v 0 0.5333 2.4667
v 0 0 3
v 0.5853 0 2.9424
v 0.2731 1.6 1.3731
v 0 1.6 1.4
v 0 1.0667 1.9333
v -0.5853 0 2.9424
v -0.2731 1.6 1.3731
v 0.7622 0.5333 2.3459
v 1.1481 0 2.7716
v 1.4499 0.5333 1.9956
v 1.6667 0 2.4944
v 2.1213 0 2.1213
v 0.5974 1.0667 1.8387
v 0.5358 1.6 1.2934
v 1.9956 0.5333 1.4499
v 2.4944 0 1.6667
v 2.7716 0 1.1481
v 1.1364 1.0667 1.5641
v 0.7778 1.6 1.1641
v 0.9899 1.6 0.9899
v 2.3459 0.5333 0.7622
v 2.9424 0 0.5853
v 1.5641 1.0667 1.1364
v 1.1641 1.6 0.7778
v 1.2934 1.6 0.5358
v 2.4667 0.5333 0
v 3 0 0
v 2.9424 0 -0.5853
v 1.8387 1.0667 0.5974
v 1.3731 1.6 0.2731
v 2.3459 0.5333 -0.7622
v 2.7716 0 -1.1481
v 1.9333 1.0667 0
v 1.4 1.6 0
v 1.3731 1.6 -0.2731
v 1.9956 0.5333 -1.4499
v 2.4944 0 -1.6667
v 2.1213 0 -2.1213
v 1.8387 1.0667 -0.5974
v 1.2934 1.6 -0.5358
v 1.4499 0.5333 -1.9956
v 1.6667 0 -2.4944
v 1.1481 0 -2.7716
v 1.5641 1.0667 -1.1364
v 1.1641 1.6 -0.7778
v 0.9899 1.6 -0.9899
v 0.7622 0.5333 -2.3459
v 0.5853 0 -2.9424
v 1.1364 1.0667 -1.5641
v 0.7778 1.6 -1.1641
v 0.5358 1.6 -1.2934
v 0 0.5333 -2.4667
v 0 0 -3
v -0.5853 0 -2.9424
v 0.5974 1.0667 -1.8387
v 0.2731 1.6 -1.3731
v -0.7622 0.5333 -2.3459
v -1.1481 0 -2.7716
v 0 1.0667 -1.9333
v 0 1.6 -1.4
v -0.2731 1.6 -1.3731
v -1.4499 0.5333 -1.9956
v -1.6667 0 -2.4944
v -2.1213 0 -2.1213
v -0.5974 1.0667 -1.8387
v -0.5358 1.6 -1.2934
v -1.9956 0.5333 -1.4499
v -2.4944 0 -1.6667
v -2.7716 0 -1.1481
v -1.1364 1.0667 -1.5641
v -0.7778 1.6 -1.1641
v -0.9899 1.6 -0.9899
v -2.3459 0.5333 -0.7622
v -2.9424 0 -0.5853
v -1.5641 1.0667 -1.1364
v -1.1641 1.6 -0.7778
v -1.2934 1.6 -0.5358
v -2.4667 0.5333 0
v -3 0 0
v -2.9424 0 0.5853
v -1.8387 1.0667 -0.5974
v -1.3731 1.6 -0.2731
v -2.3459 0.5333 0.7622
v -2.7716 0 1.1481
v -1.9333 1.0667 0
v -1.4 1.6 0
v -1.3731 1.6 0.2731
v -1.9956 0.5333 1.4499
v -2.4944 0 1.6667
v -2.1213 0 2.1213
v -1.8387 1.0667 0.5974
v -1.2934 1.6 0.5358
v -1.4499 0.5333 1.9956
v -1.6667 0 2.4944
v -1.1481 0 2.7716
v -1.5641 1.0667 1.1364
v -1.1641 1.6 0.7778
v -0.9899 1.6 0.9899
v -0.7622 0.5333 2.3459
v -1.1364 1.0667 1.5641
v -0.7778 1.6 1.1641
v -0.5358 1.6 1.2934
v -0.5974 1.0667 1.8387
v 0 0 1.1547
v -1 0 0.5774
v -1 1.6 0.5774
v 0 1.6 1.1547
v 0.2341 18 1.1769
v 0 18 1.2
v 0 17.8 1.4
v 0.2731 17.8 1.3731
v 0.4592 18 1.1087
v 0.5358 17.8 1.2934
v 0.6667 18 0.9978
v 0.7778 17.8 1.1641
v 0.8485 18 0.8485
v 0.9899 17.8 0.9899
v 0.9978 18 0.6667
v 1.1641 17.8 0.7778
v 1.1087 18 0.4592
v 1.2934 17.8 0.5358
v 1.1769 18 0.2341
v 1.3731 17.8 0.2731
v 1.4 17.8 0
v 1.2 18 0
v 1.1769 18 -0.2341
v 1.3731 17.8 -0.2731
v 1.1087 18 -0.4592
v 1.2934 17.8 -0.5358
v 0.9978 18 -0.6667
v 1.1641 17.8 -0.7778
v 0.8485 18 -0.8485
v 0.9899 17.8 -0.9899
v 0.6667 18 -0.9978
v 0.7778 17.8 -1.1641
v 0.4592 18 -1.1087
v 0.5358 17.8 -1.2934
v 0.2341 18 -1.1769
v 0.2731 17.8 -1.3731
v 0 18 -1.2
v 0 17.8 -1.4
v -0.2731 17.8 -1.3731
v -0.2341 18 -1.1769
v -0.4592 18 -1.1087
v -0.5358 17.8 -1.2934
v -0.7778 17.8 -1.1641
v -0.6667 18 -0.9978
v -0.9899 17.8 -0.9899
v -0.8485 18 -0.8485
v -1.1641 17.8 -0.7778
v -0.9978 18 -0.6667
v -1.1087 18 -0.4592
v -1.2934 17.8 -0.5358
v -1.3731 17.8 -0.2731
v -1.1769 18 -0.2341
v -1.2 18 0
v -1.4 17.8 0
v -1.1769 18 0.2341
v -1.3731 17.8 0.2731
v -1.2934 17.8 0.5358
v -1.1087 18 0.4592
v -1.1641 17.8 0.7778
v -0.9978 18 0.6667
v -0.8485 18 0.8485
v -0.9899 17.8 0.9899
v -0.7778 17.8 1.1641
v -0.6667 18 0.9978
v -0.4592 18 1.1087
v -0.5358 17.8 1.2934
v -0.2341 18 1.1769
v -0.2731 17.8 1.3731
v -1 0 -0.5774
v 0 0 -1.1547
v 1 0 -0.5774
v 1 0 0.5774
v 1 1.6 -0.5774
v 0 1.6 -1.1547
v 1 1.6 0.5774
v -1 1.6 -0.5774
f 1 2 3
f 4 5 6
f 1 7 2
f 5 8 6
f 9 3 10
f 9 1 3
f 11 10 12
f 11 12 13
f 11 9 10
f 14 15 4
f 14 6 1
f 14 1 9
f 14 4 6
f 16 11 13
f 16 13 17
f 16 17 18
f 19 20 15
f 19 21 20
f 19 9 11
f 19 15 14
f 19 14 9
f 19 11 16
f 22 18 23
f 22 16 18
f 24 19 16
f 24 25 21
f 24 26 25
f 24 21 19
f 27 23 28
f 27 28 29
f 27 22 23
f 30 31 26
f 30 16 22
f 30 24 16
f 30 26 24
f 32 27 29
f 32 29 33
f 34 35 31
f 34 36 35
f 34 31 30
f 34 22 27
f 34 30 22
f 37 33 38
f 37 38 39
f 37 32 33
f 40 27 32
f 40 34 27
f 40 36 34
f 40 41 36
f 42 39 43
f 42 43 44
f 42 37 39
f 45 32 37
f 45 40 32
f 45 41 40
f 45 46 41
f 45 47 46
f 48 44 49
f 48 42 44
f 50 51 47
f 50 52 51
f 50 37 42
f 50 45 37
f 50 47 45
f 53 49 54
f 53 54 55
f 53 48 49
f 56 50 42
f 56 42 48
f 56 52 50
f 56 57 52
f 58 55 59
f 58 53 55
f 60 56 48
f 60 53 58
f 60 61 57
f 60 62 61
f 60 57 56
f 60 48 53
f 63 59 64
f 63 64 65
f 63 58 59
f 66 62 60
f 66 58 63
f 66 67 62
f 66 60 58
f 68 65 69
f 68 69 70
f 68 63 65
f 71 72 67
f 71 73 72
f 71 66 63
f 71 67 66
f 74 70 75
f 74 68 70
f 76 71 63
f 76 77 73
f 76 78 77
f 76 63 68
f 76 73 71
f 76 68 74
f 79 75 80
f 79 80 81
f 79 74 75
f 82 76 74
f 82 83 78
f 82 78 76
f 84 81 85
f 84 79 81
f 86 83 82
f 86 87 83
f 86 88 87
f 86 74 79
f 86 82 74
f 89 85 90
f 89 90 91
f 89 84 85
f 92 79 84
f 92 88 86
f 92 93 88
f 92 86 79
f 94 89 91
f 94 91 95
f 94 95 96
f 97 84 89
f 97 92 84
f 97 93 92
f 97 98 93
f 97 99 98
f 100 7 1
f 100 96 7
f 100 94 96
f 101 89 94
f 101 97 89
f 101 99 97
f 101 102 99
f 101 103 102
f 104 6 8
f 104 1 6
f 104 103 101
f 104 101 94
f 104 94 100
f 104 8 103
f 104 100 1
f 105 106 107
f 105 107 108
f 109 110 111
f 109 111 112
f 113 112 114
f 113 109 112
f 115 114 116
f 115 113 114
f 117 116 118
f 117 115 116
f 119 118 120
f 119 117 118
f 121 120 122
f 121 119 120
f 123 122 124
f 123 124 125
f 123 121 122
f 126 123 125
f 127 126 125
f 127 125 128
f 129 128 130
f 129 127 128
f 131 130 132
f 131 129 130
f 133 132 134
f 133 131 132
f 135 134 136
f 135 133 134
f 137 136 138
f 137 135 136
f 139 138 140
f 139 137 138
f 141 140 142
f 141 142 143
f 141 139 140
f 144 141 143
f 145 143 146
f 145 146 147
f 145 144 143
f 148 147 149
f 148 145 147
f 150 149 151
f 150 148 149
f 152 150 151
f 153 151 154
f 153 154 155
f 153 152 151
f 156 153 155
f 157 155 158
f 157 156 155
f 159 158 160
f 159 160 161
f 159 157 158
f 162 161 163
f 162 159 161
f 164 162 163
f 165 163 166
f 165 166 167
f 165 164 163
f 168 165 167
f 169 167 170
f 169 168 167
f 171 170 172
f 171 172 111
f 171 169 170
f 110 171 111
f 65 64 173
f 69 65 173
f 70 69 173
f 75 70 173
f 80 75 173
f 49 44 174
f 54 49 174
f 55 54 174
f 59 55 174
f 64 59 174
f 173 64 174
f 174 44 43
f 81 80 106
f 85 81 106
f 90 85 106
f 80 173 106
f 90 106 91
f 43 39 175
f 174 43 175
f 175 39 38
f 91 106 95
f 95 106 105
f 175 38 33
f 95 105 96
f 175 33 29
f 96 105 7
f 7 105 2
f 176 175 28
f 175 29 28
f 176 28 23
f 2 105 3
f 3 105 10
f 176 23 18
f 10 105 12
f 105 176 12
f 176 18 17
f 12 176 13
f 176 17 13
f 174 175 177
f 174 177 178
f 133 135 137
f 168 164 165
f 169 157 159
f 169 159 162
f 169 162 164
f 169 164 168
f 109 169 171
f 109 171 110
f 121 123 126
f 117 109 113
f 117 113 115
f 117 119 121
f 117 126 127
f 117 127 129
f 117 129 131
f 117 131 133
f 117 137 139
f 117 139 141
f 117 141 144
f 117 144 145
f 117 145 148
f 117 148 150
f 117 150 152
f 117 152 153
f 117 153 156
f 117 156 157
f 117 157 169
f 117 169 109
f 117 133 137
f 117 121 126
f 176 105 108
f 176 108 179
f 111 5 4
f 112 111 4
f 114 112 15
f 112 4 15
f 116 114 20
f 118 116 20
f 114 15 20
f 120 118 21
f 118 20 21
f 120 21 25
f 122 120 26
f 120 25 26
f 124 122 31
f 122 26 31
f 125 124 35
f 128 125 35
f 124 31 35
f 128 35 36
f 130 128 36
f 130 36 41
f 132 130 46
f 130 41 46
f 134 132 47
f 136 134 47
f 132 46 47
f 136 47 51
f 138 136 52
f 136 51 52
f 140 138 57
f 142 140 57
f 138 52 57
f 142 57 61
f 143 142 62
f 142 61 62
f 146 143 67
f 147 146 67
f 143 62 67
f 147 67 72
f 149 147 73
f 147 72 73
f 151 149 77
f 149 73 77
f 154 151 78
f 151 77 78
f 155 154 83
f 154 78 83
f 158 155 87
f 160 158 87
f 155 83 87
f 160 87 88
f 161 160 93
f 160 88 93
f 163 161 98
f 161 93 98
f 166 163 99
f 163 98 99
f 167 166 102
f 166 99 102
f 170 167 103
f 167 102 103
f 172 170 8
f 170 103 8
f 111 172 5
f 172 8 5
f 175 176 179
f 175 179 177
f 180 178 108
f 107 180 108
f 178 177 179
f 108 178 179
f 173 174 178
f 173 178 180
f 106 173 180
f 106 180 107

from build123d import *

# Parameters (mm, degrees)
SKETCH_1_R      = 3
EXTRUDE_1_DEPTH = 1.6
CHAMFER_1_SIZE  = 1.6
SKETCH_2_R      = 1.4
EXTRUDE_2_DEPTH = 16.4
CHAMFER_2_SIZE  = 0.2


with BuildPart() as part:
    # 草图1 → 凸台-拉伸1 (new body)
    with BuildSketch(Plane(origin=(0, 0, 0), x_dir=(1, 0, 0), z_dir=(0, 1, 0))):
        with Locations(Location((0, 0, 0), (0, 0, 270))):
            Circle(SKETCH_1_R)
        Polygon((0, -1.154700538), (1, -0.577350269), (1, 0.577350269), (0, 1.154700538), (-1, 0.577350269), (-1, -0.577350269), align=None, mode=Mode.SUBTRACT)
    extrude(amount=EXTRUDE_1_DEPTH)

    # 倒角1
    # the kernel refuses this chamfer: 1.6 mm, written as the material it takes off along each edge
    with BuildSketch(Plane(origin=(0, 1.6, 0), x_dir=(0, 0, 1), z_dir=(-1, 0, 0))) as chamfer_1_piece_1:
        Polygon((3, -CHAMFER_1_SIZE), (3 - CHAMFER_1_SIZE, 0), (3, 0), align=None)
    revolve(axis=Axis((0, 1.6, 0), (0, 1, 0)), mode=Mode.SUBTRACT)

    # 草图2 → 凸台-拉伸2 (add)
    with BuildSketch(Plane(origin=(0, 1.6, 0), x_dir=(1, 0, 0), z_dir=(0, 1, 0))):
        with Locations(Location((0, 0, 0), (0, 0, 270))):
            Circle(SKETCH_2_R)
    extrude(amount=EXTRUDE_2_DEPTH)

    # 倒角2
    chamfer_2_edges = [part.edges().sort_by_distance(p)[0] for p in [
        (0, 18, -1.4),
    ]]
    chamfer(chamfer_2_edges, length=CHAMFER_2_SIZE)


solid = part.part
